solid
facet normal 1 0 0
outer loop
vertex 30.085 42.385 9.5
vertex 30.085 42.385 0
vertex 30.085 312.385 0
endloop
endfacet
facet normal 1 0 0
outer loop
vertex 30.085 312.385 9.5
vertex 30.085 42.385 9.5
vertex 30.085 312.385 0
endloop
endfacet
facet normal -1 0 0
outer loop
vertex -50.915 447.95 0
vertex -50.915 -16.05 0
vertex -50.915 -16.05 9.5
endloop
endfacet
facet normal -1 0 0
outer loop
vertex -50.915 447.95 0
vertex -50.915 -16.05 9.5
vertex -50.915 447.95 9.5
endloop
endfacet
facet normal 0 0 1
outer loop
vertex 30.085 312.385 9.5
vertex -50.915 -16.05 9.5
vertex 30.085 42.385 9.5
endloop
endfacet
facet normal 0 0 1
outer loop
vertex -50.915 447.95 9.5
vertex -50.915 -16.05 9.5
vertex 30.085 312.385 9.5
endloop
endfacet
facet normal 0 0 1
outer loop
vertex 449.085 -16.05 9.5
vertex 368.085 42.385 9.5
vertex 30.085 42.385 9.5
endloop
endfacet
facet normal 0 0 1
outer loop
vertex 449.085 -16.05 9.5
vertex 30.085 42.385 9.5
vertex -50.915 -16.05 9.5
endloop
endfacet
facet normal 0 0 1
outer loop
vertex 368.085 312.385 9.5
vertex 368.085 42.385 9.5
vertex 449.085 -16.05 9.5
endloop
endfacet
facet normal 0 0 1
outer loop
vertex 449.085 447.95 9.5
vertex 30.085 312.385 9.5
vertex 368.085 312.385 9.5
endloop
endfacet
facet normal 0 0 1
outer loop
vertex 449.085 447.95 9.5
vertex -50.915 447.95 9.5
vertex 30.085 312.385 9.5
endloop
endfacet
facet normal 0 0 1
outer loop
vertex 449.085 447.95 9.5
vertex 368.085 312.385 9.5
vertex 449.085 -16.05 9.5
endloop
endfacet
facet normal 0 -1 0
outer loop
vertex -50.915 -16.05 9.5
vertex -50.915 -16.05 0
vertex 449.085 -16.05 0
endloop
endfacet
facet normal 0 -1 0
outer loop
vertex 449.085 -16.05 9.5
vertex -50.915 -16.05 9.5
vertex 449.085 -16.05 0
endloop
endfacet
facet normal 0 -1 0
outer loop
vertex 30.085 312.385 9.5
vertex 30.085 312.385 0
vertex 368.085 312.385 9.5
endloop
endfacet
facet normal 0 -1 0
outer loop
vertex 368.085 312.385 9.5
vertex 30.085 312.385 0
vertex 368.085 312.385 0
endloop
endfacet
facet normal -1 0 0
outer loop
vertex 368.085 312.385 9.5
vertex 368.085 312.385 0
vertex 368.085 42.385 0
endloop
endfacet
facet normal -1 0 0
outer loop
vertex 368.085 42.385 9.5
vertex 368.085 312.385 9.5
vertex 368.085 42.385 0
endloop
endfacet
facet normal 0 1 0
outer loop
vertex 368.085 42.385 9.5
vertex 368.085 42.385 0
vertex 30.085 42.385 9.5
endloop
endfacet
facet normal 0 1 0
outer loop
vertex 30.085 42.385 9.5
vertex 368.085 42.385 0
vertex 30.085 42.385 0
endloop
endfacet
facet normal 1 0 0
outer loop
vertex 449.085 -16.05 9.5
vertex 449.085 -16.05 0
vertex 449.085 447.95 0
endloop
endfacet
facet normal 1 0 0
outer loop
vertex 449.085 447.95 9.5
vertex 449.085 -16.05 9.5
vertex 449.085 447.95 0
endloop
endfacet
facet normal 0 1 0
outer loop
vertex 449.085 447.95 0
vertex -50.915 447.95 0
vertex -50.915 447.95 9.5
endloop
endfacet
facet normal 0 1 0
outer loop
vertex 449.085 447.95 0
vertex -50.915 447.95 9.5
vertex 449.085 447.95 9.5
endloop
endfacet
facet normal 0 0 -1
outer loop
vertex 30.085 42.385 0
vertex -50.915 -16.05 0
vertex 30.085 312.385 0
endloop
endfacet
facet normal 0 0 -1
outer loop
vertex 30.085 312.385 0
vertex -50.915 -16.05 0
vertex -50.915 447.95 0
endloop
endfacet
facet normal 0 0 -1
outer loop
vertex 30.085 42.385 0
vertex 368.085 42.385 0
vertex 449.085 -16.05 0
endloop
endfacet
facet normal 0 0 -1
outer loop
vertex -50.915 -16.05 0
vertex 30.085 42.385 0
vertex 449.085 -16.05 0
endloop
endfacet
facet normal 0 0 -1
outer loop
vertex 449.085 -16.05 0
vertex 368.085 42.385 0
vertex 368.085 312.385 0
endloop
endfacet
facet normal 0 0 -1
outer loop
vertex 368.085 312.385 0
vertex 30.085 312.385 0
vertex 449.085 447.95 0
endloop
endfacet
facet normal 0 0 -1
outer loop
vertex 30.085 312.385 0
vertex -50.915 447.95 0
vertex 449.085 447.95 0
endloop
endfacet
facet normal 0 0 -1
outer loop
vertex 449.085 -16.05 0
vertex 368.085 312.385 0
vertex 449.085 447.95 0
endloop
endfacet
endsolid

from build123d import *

# Parameters (mm, degrees)
F0_W     = 500
F0_H     = 464
F1_DEPTH = 9.5


with BuildPart() as f1:
    # F0 (on Top) → F1 (new body)
    with BuildSketch(Plane.XY):
        with Locations((199.084524, 215.949913)):
            Rectangle(F0_W, F0_H)
        Polygon((30.084524, 312.385261), (199.084524, 312.385261), (368.084524, 312.385261), (368.084524, 42.385261), (30.084524, 42.385261), align=None, mode=Mode.SUBTRACT)
    extrude(amount=F1_DEPTH)


solid = f1.part
